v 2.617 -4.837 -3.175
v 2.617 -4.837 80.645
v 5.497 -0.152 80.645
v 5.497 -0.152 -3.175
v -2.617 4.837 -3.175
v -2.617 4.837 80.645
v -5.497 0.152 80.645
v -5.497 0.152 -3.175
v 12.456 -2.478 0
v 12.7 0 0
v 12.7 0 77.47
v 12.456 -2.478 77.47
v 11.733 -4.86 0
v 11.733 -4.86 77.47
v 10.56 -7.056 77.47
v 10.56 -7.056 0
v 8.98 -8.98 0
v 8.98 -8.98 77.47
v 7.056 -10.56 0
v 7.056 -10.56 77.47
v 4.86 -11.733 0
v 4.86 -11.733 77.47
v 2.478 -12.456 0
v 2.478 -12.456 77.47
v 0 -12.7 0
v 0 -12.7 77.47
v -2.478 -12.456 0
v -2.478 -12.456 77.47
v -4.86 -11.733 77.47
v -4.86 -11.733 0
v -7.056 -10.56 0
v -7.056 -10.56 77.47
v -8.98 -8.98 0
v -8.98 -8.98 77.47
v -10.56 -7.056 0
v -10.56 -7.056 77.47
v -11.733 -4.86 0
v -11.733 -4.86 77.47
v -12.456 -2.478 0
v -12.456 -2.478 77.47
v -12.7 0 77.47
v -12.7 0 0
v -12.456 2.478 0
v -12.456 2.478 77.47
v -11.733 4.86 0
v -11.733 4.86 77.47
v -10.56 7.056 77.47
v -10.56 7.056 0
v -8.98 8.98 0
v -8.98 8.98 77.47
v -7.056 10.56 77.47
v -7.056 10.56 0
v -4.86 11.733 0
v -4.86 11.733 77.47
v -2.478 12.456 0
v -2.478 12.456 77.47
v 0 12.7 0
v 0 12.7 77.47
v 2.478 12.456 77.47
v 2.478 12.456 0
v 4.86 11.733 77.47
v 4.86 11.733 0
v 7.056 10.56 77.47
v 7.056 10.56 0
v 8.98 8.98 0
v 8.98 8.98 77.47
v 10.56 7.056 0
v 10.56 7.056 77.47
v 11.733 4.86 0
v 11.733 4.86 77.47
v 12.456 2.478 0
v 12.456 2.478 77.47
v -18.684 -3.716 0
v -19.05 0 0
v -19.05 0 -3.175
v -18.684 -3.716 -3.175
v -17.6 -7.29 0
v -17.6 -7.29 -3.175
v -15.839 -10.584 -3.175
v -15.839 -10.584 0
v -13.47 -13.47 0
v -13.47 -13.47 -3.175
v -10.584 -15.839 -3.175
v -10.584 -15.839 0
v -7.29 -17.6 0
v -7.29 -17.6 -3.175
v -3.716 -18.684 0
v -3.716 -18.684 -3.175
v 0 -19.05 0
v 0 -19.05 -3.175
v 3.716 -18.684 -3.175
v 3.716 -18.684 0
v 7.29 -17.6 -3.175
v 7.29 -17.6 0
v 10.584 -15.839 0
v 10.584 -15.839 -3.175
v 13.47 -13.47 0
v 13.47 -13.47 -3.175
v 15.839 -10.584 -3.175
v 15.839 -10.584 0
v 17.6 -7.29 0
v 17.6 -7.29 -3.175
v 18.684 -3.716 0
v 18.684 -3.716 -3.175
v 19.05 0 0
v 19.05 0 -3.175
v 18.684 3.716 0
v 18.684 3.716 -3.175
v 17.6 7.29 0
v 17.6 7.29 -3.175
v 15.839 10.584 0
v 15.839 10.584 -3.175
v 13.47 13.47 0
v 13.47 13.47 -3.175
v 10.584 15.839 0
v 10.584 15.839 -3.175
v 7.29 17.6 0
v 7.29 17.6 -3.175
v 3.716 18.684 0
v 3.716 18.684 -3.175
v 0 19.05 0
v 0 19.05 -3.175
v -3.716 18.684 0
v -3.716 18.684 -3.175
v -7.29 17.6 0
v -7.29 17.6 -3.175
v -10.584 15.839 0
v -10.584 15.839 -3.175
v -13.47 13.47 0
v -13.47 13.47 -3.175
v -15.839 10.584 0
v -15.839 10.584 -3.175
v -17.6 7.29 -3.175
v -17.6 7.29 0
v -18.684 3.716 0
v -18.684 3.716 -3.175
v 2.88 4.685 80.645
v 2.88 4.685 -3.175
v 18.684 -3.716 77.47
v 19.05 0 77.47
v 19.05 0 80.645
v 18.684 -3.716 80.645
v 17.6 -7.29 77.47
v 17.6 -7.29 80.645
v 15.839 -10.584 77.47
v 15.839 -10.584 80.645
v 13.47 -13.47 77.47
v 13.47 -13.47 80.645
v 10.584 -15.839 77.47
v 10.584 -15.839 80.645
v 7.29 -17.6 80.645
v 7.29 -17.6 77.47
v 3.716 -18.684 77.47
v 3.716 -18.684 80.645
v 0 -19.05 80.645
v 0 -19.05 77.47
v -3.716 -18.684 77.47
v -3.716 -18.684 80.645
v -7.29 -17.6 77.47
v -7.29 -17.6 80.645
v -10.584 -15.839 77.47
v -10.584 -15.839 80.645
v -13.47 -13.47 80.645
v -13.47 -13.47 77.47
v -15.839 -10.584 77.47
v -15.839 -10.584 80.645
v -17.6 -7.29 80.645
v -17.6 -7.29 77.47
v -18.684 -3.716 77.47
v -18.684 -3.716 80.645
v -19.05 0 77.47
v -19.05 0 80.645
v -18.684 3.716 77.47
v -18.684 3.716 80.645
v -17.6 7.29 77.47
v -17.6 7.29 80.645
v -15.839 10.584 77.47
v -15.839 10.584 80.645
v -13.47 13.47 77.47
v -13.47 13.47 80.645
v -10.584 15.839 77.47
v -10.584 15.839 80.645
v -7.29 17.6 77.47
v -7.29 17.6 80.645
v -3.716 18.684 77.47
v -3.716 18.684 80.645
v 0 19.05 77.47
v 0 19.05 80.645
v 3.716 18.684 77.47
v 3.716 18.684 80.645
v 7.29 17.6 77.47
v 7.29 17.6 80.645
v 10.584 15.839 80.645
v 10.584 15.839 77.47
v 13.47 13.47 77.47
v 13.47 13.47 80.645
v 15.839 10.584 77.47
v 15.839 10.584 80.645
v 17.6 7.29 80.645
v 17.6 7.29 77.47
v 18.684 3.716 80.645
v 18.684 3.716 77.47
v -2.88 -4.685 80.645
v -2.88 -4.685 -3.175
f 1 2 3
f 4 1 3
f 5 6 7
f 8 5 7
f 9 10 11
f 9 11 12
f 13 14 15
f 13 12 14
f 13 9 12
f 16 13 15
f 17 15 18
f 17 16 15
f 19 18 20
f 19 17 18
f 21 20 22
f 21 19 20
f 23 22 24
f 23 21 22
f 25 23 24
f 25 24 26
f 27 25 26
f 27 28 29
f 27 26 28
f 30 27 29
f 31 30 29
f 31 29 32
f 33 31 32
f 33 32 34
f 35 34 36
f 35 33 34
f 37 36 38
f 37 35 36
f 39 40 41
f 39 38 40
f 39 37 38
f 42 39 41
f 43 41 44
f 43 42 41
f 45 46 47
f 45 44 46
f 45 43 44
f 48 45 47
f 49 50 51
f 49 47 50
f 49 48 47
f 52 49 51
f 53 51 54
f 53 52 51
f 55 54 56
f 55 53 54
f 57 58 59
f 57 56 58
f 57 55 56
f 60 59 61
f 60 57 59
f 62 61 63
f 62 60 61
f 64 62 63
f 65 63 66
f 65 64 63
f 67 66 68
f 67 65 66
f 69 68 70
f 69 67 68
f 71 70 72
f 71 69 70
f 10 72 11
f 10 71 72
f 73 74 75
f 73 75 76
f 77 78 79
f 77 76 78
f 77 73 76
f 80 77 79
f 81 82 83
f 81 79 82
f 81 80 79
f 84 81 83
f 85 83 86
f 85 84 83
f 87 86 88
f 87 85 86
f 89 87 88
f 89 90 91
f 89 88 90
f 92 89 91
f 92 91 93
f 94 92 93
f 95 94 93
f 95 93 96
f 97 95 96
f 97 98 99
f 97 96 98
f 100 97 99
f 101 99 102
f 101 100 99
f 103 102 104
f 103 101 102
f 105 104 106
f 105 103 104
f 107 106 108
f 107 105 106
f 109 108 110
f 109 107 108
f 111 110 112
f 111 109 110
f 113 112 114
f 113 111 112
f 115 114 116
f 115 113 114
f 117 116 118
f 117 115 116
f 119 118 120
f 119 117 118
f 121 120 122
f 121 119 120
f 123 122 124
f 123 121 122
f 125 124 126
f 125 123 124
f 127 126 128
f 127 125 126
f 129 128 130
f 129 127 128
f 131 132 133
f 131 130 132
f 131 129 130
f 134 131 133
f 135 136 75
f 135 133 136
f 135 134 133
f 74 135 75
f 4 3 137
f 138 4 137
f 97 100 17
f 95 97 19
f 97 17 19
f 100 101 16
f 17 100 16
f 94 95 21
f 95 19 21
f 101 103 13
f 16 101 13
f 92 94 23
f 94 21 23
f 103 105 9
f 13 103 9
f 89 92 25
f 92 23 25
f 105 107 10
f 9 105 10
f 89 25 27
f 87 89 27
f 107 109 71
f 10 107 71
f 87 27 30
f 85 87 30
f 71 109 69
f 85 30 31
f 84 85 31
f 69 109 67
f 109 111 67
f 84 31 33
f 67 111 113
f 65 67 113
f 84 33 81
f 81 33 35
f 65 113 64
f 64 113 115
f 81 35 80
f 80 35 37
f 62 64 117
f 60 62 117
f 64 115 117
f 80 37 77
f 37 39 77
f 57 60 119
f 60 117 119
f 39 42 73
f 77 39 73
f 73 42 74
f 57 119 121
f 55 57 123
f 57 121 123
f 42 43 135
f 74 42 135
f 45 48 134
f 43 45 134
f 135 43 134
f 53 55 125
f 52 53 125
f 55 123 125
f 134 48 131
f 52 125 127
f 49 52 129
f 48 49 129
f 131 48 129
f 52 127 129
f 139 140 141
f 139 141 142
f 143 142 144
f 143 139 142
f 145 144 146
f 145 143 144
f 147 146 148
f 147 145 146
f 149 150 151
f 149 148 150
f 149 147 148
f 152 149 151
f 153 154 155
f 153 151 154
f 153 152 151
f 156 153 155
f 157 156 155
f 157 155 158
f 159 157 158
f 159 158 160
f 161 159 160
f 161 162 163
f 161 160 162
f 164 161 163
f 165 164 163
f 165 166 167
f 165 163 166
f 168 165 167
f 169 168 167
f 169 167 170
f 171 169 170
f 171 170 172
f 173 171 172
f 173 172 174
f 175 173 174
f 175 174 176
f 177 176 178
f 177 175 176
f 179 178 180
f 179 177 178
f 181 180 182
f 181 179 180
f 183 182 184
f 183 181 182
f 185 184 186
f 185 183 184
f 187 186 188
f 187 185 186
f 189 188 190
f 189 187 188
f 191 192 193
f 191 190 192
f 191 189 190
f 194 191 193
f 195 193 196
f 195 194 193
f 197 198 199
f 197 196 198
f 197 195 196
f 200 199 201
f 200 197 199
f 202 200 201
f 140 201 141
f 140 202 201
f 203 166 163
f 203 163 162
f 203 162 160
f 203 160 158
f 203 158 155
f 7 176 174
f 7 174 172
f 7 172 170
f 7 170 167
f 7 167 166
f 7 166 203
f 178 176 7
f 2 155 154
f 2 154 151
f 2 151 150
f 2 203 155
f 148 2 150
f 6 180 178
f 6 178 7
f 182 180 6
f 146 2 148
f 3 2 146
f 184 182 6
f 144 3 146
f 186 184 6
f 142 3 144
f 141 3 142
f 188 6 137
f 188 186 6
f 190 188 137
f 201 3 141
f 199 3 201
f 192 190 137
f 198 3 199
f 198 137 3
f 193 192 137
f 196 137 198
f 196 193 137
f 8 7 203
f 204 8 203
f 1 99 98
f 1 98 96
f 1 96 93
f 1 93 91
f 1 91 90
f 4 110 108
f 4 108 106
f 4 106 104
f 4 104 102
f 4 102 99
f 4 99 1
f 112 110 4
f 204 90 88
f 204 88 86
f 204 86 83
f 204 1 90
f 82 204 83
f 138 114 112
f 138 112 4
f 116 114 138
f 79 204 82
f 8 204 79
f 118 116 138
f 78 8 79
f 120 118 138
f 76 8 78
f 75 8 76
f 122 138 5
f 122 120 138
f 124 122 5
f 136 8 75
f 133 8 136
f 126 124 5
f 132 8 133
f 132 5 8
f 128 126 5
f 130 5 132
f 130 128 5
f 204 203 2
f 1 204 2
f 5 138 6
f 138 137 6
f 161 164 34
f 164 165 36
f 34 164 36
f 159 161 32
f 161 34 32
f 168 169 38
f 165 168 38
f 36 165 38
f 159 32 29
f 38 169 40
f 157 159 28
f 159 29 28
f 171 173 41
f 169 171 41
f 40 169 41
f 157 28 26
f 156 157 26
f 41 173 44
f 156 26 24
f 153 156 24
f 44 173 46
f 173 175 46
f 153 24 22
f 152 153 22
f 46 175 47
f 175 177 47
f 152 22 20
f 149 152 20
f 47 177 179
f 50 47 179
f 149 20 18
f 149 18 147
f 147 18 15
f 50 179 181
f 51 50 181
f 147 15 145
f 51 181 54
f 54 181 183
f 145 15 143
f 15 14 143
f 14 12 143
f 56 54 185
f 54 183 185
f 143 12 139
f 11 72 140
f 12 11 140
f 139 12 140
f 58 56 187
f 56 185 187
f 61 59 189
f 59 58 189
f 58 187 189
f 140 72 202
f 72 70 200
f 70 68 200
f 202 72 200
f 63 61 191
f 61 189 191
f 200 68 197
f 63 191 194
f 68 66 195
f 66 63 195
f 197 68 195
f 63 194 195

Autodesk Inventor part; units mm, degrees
ref_plane "YZ Plane" through (0, 0, 0) normal (1, 0, 0) x (0, 1, 0)
ref_plane "XZ Plane" through (0, 0, 0) normal (0, 1, 0) x (-1, 0, 0)
ref_plane "XY Plane" through (0, 0, 0) normal (0, 0, 1) x (1, 0, 0)
sketch "Sketch1" plane through (0, 0, 0) normal (0, 0, 1) x (1, 0, 0)
  line L0 (-5.4972, 0.152) -> (-2.6169, 4.8367)
  line L1 (-2.6169, 4.8367) -> (2.8802, 4.6847)
  line L2 (2.8802, 4.6847) -> (5.4972, -0.152)
  line L3 (5.4972, -0.152) -> (2.6169, -4.8367)
  line L4 (2.6169, -4.8367) -> (-2.8802, -4.6847)
  line L5 (-2.8802, -4.6847) -> (-5.4972, 0.152)
  circle A0 centre (0, 0) radius 12.7
  dimension "d0" = 9.525
  dimension "d1" = 25.4
extrude "Extrusion1" add sketch "Sketch1" along normal blind 77.47
sketch "Sketch3" plane through (0, 0, 77.47) normal (0, 0, 1) x (1, 0, 0)
  line L0 (-5.4972, 0.152) -> (-2.6169, 4.8367) projected
  line L1 (-5.4972, 0.152) -> (-2.6169, 4.8367)
  line L2 (-2.6169, 4.8367) -> (2.8802, 4.6847)
  line L3 (2.8802, 4.6847) -> (5.4972, -0.152)
  line L4 (5.4972, -0.152) -> (2.6169, -4.8367)
  line L5 (2.6169, -4.8367) -> (-2.8802, -4.6847)
  line L6 (-2.8802, -4.6847) -> (-5.4972, 0.152)
  circle A0 centre (0, 0) radius 19.05
  dimension "d4" = 38.1
extrude "Extrusion2" add sketch "Sketch3" along normal blind 3.175
sketch "Sketch4" plane through (0, 0, 0) normal (0, 0, -1) x (-1, 0, 0)
  line L0 (-5.4972, -0.152) -> (-2.8802, 4.6847)
  line L1 (-2.8802, 4.6847) -> (2.6169, 4.8367)
  line L2 (2.6169, 4.8367) -> (5.4972, 0.152)
  line L3 (5.4972, 0.152) -> (2.8802, -4.6847)
  line L4 (2.8802, -4.6847) -> (-2.6169, -4.8367)
  line L5 (-2.6169, -4.8367) -> (-5.4972, -0.152)
  line L6 (2.8802, -4.6847) -> (-2.6169, -4.8367) projected
  circle A0 centre (0, 0) radius 19.05
  dimension "d7" = 9.525
  dimension "d8" = 180
  dimension "d11" = 38.1
extrude "Extrusion3" add sketch "Sketch4" along normal blind 3.175
properties part number "Polycord conveyor"
